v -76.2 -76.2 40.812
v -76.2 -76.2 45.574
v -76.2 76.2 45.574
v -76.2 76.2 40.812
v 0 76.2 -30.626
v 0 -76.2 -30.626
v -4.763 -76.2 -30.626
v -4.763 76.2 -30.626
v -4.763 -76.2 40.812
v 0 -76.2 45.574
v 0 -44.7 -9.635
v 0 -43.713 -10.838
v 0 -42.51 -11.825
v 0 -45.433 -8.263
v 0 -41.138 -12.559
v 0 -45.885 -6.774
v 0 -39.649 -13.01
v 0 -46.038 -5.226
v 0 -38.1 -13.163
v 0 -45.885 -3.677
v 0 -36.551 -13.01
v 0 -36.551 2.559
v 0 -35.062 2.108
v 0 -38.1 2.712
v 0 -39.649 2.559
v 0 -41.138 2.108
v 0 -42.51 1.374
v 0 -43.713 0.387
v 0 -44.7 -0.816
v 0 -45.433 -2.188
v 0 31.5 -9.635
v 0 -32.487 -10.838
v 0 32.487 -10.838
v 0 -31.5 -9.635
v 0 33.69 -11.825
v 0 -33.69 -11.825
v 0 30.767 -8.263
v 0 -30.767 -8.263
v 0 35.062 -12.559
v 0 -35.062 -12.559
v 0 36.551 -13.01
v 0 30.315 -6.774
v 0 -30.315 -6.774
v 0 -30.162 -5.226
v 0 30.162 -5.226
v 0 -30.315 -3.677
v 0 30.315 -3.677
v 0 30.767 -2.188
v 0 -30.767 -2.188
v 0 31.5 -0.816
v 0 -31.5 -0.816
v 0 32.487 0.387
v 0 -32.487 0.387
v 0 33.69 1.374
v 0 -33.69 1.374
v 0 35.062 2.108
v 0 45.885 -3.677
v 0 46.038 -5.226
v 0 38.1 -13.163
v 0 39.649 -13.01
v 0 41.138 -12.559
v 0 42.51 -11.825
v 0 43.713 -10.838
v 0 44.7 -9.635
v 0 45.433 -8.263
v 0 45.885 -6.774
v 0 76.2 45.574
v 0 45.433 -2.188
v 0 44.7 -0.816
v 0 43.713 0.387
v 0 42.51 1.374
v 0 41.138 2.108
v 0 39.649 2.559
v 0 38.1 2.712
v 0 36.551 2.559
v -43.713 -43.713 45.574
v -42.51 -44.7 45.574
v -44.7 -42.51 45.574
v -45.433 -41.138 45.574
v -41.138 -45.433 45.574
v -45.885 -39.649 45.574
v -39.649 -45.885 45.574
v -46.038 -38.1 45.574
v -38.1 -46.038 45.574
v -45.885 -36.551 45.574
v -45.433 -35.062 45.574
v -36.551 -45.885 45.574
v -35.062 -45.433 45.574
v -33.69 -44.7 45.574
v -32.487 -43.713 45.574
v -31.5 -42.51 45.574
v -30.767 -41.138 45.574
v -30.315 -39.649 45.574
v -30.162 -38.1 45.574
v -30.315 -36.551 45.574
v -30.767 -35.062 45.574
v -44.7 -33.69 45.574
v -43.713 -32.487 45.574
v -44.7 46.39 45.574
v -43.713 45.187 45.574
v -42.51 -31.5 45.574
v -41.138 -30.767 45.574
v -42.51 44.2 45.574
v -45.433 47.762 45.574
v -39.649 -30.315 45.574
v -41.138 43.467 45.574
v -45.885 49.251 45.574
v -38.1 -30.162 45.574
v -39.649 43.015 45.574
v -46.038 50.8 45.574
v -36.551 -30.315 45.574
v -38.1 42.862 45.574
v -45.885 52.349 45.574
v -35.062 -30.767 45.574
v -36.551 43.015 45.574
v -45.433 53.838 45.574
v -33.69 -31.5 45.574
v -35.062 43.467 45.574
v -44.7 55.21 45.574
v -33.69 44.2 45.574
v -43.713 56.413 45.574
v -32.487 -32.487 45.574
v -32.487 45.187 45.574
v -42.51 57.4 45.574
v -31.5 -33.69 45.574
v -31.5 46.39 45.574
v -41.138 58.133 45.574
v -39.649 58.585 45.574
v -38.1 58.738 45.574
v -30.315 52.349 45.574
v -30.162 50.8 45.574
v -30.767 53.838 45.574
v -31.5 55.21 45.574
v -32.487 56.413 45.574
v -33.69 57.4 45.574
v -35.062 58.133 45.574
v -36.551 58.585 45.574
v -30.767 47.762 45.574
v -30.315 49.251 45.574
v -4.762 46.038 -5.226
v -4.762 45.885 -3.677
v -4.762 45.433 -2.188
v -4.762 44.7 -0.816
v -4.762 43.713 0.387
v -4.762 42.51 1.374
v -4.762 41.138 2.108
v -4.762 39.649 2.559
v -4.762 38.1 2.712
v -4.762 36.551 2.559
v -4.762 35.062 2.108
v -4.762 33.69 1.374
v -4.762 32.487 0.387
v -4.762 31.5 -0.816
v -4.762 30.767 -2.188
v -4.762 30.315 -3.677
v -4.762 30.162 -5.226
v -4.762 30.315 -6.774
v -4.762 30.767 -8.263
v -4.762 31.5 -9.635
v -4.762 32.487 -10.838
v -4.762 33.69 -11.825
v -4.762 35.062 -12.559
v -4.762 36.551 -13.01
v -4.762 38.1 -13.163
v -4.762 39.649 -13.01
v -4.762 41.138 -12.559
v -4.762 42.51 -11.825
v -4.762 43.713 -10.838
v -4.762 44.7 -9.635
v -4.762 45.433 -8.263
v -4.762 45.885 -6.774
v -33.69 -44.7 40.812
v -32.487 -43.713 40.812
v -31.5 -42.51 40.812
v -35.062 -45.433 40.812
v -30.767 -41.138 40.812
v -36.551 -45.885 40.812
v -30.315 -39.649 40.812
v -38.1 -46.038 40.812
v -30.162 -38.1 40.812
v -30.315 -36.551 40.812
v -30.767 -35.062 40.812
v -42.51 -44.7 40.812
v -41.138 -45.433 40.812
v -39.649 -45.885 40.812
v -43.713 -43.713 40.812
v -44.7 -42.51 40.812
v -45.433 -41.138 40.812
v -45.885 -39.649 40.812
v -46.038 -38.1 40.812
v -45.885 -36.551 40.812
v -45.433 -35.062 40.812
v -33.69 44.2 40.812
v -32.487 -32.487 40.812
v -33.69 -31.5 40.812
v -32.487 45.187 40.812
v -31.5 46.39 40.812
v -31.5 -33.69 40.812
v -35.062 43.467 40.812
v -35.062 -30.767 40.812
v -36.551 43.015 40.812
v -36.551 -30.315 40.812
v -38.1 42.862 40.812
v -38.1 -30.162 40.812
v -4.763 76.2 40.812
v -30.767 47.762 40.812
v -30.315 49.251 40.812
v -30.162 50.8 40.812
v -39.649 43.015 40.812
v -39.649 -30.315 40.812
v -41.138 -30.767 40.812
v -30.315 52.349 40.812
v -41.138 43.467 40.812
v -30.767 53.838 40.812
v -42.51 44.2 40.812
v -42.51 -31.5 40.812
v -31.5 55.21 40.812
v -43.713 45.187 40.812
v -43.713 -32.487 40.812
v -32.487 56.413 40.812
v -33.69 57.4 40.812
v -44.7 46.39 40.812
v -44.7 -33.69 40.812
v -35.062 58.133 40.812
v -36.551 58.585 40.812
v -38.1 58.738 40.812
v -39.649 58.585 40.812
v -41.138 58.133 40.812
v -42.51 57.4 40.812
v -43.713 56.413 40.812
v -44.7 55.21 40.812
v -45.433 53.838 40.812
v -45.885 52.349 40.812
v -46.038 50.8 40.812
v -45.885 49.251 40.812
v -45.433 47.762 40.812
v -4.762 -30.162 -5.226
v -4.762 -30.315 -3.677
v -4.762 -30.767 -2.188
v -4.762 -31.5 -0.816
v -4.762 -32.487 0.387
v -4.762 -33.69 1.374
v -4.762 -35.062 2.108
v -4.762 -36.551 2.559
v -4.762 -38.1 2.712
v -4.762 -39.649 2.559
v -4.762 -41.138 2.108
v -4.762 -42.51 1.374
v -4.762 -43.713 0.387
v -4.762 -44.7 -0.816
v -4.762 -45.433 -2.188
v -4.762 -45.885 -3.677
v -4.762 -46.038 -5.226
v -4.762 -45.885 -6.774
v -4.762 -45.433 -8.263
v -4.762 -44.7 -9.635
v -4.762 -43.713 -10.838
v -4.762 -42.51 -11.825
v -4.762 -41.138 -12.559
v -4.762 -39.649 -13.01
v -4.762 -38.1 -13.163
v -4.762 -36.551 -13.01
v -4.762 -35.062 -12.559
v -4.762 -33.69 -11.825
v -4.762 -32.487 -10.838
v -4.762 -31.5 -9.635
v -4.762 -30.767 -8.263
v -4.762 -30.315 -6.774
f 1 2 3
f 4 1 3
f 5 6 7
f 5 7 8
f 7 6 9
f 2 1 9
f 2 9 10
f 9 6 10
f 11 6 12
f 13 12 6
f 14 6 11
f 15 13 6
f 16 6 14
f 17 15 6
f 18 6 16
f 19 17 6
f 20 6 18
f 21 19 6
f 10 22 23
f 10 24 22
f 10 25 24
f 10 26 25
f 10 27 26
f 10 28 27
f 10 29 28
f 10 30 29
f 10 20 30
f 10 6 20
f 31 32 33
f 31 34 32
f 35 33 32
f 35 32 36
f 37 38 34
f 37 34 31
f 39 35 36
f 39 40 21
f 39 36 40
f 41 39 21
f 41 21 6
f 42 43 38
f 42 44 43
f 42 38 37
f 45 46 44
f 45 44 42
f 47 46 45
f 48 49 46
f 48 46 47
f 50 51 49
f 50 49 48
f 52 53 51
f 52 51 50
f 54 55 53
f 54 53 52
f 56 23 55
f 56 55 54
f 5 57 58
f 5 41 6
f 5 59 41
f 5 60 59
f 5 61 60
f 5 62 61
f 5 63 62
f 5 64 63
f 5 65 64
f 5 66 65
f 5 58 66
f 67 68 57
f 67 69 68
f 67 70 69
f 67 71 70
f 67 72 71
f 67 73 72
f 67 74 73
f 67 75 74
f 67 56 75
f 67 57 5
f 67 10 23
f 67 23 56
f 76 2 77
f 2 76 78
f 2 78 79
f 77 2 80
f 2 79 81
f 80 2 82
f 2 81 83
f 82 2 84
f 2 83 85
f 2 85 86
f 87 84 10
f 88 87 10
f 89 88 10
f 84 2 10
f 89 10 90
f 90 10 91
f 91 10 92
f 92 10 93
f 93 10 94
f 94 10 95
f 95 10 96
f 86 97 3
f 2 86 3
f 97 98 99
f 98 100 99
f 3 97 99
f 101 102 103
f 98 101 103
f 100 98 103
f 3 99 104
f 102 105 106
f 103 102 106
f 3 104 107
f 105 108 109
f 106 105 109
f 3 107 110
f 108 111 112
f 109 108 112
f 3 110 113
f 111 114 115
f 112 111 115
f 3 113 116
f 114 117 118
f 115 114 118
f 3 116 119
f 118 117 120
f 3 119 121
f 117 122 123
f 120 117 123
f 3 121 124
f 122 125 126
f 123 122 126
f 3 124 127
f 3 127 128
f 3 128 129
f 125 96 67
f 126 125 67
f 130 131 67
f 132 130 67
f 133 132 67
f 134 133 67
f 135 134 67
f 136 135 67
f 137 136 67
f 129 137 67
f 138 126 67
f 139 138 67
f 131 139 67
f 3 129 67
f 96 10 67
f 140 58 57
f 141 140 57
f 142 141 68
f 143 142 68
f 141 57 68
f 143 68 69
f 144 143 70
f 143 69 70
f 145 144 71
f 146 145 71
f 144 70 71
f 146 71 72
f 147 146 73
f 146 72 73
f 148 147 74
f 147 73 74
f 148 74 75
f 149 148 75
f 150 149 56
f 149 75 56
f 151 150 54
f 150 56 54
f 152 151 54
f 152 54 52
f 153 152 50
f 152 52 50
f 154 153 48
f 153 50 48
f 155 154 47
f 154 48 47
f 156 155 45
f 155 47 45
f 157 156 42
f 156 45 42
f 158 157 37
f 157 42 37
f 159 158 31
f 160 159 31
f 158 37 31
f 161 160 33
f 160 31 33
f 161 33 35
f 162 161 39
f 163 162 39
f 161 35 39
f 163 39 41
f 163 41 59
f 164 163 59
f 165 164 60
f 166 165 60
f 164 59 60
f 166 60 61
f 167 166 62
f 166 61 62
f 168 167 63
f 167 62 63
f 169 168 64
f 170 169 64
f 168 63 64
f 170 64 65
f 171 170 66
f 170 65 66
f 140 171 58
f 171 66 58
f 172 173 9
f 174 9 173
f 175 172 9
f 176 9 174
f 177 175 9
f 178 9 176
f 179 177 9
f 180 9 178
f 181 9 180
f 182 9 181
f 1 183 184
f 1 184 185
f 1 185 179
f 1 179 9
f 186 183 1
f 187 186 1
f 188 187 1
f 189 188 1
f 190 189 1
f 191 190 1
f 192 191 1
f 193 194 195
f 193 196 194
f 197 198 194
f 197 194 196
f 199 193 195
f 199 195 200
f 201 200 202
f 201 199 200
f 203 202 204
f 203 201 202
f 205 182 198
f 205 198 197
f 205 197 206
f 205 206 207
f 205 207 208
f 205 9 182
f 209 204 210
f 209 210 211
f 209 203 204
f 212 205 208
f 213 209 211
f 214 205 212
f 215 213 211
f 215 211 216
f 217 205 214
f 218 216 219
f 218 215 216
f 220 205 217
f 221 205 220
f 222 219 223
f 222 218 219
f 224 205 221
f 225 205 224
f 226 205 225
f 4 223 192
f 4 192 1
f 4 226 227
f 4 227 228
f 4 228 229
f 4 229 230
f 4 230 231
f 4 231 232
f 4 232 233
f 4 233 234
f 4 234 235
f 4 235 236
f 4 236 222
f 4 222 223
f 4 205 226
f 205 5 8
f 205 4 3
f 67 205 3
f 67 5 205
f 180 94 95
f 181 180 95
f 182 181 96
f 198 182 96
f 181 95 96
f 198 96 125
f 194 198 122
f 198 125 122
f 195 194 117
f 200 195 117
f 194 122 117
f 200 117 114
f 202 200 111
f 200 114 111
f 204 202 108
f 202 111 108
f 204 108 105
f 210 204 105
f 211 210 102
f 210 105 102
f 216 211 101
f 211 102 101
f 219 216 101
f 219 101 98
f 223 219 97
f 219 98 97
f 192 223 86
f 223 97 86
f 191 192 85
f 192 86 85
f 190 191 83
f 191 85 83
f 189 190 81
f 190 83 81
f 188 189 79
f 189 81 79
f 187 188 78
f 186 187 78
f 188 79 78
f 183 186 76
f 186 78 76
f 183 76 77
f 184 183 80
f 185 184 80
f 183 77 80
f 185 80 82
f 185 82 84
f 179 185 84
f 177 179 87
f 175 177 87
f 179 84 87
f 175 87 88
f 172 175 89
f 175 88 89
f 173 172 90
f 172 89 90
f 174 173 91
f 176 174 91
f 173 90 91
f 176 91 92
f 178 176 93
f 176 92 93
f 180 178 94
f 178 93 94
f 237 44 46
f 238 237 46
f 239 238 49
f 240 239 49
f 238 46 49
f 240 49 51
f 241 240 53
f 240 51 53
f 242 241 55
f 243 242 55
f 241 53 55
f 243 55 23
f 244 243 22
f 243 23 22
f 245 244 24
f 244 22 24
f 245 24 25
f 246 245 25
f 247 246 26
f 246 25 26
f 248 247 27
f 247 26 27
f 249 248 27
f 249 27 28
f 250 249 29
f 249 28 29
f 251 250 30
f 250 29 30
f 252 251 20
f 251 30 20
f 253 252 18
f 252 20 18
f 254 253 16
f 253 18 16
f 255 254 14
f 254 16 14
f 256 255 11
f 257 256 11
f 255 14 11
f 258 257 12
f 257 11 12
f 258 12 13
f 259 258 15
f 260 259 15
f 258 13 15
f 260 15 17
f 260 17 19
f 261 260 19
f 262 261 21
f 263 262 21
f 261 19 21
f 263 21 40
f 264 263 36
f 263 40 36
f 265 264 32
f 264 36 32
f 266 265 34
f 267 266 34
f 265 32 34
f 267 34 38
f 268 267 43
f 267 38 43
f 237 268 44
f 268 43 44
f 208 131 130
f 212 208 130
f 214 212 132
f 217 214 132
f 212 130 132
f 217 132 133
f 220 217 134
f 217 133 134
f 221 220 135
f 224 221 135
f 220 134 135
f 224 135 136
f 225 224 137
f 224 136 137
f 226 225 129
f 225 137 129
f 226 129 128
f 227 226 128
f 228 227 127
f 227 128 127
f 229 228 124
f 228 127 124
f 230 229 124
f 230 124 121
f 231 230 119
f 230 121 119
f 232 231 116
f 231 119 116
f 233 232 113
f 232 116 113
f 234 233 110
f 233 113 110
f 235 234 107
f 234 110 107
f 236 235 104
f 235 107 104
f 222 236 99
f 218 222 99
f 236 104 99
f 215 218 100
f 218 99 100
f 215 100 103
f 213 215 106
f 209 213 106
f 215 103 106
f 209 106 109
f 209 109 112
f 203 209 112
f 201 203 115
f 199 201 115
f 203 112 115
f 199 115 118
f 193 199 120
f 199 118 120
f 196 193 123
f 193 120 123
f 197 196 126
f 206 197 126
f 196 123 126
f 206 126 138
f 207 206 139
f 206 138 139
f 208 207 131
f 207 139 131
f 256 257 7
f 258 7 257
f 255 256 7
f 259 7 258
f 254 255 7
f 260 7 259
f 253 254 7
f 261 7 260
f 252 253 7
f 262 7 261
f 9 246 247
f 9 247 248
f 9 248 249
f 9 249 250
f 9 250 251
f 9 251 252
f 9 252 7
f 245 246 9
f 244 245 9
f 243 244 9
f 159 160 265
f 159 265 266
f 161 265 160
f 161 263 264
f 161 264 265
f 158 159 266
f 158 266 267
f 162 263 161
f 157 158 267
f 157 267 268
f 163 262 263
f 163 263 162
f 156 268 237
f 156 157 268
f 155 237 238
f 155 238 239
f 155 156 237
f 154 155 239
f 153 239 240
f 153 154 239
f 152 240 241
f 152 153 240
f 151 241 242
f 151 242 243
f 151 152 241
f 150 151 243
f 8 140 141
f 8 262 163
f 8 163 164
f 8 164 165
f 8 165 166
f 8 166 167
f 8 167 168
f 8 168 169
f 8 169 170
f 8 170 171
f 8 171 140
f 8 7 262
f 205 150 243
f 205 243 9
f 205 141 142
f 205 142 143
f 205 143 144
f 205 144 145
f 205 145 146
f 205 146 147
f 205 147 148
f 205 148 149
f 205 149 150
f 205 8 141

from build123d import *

# Parameters (mm, degrees)
F0_W     = 152.4
F0_H     = 76.2
F1_DEPTH = 76.2
F2_W     = 71.4375
F2_H     = 71.4375
F3_DEPTH = 152.4
F4_R     = 7.9375
F5_DEPTH = 4.7625
F6_R     = 7.9375
F7_DEPTH = 4.7625


with BuildPart() as f1:
    # F0 (on Right) → F1 (new body)
    with BuildSketch(Plane.YZ):
        with Locations((0, 7.474488)):
            Rectangle(F0_W, F0_H)
    extrude(amount=-F1_DEPTH)

    # F2 (on face) → F3 (cut)
    with BuildSketch(Plane(origin=(0, 76.2, 0), x_dir=(-1, 0, 0), z_dir=(0, 1, 0))):
        with Locations((40.48125, 5.093238)):
            Rectangle(F2_W, F2_H)
    extrude(amount=-F3_DEPTH, mode=Mode.SUBTRACT)

    # F4 (on face) → F5 (cut, through all)
    with BuildSketch(Plane.YZ):
        with Locations((-38.1, -5.225512)):
            Circle(F4_R)
        with Locations((38.1, -5.225512)):
            Circle(F4_R)
    extrude(amount=-F5_DEPTH, mode=Mode.SUBTRACT)

    # F6 (on face) → F7 (cut, through all)
    with BuildSketch(Plane.XY.offset(45.574488)):
        with Locations((-38.1, 50.8)):
            Circle(F6_R)
        with Locations((-38.1, -38.1)):
            Circle(F6_R)
    extrude(amount=-F7_DEPTH, mode=Mode.SUBTRACT)


solid = f1.part
